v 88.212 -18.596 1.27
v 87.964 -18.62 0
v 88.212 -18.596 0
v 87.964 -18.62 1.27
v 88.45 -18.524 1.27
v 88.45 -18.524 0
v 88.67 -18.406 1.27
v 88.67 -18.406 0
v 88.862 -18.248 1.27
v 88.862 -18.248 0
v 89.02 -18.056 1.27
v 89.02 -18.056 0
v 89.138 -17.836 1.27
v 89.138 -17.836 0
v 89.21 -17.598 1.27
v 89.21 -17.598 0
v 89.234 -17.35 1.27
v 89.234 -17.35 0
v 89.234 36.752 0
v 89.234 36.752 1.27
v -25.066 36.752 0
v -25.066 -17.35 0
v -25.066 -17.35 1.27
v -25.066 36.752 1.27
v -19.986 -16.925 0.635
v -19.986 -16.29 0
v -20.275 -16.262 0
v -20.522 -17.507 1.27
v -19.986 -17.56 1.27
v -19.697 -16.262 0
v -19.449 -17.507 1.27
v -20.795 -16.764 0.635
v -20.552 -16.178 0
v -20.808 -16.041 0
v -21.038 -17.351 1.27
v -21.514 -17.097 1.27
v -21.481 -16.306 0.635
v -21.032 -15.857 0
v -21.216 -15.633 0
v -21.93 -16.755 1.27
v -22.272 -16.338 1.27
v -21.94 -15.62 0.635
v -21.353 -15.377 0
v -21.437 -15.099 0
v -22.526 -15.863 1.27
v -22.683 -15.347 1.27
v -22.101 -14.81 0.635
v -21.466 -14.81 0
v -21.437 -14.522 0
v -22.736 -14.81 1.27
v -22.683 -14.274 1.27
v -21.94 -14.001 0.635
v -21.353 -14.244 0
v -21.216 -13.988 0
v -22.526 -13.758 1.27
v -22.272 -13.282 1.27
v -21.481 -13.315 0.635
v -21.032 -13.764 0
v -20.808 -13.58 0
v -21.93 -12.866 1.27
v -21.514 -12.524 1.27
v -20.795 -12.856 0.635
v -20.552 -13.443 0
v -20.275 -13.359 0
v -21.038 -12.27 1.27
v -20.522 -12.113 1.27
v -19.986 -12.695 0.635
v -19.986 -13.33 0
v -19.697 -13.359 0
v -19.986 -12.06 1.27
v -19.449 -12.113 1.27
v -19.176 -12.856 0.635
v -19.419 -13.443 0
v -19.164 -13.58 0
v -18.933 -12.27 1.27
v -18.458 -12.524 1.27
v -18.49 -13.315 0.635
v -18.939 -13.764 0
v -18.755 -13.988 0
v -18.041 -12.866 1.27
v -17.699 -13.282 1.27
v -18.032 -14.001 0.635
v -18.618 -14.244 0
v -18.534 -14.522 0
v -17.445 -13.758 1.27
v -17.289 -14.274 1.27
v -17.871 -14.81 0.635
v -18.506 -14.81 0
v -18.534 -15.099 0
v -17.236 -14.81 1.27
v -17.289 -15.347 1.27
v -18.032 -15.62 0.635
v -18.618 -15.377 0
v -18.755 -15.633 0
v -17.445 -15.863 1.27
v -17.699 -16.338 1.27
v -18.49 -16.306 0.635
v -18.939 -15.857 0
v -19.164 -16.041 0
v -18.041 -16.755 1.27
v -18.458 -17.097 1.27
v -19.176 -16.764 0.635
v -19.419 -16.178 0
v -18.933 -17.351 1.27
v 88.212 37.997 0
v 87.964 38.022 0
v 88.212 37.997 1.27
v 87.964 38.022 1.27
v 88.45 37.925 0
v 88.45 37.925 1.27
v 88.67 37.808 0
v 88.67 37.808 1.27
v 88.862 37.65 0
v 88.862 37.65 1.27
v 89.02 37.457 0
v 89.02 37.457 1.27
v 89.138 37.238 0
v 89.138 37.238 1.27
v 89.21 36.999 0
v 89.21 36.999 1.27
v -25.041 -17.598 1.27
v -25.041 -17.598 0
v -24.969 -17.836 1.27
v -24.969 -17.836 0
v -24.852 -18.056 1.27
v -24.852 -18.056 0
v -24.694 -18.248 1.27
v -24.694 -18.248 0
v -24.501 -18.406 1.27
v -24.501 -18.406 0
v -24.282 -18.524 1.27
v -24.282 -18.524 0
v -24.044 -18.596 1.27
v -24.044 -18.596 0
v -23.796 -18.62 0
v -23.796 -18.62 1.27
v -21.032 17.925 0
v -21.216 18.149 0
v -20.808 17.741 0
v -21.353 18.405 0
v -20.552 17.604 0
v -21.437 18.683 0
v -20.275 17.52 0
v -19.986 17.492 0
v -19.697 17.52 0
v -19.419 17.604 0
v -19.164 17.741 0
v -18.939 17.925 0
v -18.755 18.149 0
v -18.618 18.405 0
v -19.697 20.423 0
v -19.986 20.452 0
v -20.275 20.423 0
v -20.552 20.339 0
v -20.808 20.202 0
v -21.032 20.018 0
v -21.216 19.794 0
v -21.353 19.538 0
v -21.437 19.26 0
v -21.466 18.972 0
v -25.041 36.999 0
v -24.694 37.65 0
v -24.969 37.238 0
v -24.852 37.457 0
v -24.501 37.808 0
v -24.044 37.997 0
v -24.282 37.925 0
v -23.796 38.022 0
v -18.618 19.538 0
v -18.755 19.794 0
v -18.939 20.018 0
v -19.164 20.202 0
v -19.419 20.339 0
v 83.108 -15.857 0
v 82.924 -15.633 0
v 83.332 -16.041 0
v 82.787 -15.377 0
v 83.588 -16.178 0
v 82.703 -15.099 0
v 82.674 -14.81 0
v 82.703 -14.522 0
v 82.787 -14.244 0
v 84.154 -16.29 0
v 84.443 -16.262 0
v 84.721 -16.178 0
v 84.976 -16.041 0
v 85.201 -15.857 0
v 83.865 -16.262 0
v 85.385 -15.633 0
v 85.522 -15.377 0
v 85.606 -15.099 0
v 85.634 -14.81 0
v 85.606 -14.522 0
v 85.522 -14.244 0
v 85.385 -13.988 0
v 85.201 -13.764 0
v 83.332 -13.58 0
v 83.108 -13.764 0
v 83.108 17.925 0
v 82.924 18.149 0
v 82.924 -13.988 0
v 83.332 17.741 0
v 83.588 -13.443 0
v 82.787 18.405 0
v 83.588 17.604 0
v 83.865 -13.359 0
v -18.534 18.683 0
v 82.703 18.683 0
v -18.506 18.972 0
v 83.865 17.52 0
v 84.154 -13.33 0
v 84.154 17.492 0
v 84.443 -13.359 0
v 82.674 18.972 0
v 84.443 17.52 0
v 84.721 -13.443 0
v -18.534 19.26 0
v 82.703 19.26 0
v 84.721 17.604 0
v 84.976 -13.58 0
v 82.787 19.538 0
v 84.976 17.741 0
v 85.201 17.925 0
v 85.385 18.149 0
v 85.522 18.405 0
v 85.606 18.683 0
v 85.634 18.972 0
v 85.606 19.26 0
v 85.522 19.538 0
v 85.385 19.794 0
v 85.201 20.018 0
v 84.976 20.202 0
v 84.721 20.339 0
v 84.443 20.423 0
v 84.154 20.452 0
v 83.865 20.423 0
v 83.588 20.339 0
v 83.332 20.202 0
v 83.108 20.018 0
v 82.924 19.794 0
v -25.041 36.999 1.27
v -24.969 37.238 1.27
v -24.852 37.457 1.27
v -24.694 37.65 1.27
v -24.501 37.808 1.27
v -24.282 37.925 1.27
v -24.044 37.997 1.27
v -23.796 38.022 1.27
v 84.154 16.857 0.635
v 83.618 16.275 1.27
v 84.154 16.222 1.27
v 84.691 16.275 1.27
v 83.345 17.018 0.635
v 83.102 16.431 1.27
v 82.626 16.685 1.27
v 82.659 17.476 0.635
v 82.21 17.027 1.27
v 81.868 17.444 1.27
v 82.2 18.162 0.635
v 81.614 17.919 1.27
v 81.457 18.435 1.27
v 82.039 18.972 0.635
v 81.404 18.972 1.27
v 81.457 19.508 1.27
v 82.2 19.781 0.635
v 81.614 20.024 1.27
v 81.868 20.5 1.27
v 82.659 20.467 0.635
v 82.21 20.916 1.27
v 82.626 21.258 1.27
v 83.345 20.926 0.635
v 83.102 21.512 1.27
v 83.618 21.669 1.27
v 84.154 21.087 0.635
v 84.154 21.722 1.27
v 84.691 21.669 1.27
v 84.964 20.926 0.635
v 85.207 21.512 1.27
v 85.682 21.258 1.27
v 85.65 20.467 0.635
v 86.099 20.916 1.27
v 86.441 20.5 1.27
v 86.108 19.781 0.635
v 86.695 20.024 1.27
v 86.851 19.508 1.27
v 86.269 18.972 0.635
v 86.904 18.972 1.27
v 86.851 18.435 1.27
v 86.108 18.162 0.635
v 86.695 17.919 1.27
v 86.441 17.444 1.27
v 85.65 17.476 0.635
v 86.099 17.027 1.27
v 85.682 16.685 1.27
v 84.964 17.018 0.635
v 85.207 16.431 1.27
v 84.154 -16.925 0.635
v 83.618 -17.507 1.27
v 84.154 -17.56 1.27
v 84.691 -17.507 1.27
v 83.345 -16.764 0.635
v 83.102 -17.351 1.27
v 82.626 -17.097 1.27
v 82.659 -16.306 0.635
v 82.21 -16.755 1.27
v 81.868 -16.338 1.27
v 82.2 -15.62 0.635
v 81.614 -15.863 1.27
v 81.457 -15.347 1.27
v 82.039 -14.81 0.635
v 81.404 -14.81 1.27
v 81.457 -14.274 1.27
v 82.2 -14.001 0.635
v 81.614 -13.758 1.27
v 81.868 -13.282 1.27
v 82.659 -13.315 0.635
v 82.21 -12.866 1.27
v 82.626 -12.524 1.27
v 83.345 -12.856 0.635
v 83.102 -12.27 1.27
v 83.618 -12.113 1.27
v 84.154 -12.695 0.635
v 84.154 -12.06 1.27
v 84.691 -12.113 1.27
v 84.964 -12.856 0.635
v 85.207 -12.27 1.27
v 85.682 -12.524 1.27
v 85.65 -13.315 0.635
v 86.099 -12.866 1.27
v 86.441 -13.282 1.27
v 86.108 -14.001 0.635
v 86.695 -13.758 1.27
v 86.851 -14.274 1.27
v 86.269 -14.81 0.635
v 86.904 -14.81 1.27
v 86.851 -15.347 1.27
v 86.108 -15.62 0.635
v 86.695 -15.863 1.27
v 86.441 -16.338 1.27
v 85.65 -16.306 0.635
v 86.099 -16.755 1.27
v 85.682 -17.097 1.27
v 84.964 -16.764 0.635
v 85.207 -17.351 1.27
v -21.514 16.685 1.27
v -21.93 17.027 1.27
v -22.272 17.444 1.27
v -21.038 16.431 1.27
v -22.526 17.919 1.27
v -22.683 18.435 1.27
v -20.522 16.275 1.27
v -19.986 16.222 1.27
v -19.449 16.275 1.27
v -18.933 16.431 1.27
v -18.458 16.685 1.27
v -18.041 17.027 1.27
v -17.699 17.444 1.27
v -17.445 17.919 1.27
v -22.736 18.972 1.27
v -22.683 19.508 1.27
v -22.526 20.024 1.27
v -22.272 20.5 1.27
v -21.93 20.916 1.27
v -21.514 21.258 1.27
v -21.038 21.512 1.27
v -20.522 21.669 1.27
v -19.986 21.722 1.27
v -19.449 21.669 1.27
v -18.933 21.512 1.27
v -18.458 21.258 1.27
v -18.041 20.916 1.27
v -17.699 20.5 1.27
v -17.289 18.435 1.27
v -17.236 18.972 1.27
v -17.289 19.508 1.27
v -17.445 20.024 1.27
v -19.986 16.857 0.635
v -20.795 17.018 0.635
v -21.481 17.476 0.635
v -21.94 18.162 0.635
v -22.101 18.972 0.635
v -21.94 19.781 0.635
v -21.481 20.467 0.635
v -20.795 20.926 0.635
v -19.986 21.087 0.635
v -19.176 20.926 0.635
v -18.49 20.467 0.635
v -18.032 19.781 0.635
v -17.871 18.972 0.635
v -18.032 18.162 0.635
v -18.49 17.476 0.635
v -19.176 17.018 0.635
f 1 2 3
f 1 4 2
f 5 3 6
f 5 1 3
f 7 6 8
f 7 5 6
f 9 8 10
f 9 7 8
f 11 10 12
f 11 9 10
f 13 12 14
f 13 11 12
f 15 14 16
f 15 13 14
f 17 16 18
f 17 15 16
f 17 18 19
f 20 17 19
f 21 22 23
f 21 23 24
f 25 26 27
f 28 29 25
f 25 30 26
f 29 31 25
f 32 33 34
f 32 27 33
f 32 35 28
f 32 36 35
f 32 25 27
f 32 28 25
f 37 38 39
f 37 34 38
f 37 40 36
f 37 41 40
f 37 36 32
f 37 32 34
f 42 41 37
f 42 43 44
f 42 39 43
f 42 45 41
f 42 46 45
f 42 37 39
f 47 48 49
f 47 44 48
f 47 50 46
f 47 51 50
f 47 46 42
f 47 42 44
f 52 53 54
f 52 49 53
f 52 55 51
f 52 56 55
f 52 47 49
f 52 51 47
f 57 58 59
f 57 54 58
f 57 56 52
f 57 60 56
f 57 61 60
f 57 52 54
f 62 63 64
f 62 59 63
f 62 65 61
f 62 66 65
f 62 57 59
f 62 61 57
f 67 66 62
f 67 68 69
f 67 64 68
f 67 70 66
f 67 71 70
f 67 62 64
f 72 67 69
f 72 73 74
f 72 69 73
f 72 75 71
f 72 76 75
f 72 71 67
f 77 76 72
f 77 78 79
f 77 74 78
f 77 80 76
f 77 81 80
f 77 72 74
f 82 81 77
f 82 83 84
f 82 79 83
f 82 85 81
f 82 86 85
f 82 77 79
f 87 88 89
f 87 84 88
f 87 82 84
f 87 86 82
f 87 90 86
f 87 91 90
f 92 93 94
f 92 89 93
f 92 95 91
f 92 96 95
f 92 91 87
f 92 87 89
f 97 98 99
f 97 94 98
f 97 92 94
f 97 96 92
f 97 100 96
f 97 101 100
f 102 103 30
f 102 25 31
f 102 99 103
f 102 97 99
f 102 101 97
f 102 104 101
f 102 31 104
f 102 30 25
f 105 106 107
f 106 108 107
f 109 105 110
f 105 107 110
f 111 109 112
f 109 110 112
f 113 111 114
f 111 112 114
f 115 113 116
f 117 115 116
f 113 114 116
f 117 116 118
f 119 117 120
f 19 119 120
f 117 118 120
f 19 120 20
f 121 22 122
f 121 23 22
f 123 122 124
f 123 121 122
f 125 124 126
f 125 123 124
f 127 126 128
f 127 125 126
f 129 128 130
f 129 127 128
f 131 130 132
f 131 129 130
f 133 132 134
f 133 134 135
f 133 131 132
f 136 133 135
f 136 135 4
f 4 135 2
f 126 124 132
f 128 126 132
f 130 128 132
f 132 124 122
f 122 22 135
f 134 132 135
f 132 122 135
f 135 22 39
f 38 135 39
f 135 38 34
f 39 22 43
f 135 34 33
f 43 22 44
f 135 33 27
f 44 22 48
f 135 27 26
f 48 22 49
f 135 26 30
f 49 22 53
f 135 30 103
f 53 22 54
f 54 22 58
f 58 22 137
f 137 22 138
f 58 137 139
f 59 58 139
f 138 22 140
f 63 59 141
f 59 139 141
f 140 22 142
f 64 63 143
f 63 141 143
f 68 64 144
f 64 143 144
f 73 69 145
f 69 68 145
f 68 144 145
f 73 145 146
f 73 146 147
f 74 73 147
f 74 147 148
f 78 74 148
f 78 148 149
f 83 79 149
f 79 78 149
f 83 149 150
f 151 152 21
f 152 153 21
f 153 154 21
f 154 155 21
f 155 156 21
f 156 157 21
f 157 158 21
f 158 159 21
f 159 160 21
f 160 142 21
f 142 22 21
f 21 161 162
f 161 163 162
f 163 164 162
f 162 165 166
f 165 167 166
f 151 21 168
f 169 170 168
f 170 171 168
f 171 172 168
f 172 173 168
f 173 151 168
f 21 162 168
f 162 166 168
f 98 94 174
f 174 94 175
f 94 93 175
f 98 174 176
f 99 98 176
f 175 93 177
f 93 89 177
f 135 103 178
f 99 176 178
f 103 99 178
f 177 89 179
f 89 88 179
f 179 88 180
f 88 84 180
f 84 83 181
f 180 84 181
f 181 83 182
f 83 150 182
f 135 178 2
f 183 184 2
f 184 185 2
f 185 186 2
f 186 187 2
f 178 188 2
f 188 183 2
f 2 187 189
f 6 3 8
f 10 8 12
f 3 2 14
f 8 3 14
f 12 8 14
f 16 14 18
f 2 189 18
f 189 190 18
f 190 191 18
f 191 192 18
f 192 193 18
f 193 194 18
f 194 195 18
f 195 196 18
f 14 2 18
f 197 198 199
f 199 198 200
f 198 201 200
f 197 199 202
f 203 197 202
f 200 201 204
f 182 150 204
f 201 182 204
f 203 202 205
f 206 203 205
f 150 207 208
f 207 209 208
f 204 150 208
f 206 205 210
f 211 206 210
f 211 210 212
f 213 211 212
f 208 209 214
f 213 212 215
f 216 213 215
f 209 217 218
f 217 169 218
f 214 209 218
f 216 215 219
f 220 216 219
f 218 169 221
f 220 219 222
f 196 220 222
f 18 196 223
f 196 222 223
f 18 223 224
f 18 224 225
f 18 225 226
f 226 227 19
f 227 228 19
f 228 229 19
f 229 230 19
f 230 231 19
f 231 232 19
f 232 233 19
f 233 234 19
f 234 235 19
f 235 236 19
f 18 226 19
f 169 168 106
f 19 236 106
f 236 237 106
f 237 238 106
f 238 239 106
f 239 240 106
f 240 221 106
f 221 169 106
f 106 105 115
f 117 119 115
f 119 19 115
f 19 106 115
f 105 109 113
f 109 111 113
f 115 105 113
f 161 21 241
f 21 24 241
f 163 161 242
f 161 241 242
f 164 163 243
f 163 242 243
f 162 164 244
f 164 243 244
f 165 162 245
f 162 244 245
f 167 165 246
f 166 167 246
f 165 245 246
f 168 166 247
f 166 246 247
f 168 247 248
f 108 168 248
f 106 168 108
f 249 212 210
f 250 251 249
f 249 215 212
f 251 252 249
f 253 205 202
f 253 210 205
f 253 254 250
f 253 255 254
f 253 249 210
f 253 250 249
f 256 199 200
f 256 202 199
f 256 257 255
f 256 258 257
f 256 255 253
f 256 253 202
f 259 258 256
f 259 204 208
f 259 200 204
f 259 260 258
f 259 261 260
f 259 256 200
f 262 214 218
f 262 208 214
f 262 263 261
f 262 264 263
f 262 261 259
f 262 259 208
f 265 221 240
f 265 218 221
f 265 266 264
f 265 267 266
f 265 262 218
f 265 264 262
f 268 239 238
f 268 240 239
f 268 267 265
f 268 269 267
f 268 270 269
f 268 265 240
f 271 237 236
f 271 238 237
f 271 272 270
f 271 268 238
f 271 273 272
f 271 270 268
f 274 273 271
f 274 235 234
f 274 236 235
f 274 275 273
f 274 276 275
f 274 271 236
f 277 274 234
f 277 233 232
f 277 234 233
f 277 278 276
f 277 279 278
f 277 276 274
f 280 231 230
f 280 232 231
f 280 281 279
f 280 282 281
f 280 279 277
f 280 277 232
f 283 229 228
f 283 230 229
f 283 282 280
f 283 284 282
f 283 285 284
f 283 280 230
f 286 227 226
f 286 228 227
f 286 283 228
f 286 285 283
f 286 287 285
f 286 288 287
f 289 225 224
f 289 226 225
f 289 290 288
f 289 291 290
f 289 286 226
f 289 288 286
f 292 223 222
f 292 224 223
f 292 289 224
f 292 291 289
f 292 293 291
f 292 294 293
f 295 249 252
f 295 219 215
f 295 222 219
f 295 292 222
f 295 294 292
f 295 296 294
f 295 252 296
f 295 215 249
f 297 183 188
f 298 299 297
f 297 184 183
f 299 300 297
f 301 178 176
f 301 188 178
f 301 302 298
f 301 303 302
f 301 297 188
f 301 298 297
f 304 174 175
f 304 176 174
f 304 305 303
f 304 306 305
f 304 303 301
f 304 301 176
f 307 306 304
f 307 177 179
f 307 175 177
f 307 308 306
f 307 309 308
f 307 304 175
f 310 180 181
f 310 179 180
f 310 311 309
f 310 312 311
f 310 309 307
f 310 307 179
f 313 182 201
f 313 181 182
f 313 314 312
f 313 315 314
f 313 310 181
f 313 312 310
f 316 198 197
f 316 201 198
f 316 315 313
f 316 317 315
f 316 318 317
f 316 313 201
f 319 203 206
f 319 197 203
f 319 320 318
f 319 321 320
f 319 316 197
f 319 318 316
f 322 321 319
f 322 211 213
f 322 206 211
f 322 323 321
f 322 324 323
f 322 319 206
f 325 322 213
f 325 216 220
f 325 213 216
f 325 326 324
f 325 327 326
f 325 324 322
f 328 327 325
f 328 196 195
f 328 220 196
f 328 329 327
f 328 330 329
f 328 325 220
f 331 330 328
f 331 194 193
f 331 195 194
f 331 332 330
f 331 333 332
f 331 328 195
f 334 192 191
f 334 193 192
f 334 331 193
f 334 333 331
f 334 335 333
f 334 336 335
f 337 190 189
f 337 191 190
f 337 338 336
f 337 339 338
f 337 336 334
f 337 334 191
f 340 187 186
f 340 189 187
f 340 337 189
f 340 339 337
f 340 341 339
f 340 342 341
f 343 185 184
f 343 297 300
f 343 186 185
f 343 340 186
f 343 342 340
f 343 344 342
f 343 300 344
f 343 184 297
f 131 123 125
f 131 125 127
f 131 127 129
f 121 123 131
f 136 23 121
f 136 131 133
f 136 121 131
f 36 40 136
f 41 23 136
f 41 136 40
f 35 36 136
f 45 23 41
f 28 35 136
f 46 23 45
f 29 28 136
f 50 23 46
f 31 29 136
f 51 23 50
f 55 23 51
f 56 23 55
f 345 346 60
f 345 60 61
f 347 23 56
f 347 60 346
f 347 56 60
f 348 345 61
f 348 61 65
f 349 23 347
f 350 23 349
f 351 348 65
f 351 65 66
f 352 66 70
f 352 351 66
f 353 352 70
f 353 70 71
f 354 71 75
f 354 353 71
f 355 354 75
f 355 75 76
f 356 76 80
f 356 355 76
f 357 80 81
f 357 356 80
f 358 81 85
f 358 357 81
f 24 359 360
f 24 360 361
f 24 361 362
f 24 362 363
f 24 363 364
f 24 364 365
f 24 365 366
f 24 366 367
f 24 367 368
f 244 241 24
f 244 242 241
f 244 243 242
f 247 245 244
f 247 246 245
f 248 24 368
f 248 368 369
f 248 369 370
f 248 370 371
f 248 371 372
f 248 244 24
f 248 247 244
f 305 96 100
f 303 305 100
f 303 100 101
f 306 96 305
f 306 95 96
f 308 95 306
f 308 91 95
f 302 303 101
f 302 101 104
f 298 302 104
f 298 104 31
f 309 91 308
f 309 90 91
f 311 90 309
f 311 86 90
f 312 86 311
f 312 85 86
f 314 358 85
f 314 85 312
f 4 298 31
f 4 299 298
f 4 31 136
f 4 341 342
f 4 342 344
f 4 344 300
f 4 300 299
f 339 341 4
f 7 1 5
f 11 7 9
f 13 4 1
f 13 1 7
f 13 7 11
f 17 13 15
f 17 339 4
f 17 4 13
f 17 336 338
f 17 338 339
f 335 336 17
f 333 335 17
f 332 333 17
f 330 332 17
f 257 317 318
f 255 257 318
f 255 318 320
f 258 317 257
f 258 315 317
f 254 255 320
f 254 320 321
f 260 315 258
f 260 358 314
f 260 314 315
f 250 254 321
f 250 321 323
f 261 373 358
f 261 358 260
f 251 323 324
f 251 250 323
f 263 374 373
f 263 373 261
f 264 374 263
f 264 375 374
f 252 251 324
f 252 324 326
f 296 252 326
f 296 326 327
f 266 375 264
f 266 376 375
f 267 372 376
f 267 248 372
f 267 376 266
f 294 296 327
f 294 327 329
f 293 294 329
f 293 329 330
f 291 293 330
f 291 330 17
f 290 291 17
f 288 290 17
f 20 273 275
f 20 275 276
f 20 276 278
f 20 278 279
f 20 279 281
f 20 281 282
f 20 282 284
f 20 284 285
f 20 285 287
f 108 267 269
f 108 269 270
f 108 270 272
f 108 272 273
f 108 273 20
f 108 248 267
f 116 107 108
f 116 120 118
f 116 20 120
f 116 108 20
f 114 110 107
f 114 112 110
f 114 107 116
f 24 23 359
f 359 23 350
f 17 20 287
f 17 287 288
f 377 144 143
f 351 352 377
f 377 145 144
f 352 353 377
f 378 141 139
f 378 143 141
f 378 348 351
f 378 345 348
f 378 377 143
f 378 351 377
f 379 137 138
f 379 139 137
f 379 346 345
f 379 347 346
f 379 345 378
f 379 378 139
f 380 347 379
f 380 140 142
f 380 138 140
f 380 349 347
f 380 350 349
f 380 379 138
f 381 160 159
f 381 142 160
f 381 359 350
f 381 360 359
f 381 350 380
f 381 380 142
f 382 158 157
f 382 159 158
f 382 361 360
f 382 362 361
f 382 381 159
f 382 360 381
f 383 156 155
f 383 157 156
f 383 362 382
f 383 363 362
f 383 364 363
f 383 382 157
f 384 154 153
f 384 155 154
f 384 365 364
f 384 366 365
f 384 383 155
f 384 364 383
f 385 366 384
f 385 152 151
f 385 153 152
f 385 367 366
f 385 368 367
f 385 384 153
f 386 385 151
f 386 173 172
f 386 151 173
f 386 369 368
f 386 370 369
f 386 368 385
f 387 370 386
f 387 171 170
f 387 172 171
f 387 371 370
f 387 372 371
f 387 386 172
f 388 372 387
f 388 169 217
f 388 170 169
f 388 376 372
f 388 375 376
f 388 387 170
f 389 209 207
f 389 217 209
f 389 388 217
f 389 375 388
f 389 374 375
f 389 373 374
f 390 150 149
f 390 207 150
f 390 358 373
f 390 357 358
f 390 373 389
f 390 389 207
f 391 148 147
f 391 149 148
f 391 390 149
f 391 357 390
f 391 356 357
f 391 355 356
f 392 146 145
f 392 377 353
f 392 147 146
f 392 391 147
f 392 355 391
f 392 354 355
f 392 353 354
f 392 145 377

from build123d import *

# Parameters (mm, degrees)
SKETCH2_W                                    = 114.3
SKETCH2_H                                    = 56.642
BOSS_EXTRUDE1_DEPTH                          = 1.27
CSK_FOR_M2_5_COUNTERSUNK_FLAT_HEAD_S_2_COUNT = 2
CSK_FOR_M2_5_COUNTERSUNK_FLAT_HEAD_S_2_PITCH = 33.782
CSK_FOR_M2_5_COUNTERSUNK_FLAT_HEAD_S_3_COUNT = 2
CSK_FOR_M2_5_COUNTERSUNK_FLAT_HEAD_S_3_PITCH = 109.482250269
CSK_FOR_M2_5_COUNTERSUNK_FLAT_HEAD_S_4_COUNT = 2
CSK_FOR_M2_5_COUNTERSUNK_FLAT_HEAD_S_4_PITCH = 104.14
FILLET1_R                                    = 1.27


with BuildPart() as part:
    # Sketch2 → Boss-Extrude1 (new body)
    with BuildSketch(Plane.XY):
        with Locations((32.084210526, 9.700699248)):
            Rectangle(SKETCH2_W, SKETCH2_H)
    extrude(amount=BOSS_EXTRUDE1_DEPTH)

    # Sketch6 → CSK for M2.5 Countersunk Flat Head Screw1 (revolve, cut)
    with BuildSketch(Plane(origin=(-19.985789474, 18.971699248, 1.27), x_dir=(0, -1, 0), z_dir=(1, 0, 0))):
        Polygon((0, 0), (0, 1.27), (1.45, 1.27), (1.45, 1.3), (2.75, 0), align=None)
    csk_for_m2_5_countersunk_flat_head_screw = revolve(axis=Axis((-19.985789474, 18.971699248, 7.62), (0, 0, -1)), mode=Mode.SUBTRACT)

    # CSK for M2.5 Countersunk Flat Head S 2: CSK for M2.5 Countersunk Flat Head Screw1 ×2
    with Locations(*[(0, -i * CSK_FOR_M2_5_COUNTERSUNK_FLAT_HEAD_S_2_PITCH, 0) for i in range(1, CSK_FOR_M2_5_COUNTERSUNK_FLAT_HEAD_S_2_COUNT)]):
        add(csk_for_m2_5_countersunk_flat_head_screw, mode=Mode.SUBTRACT)

    # CSK for M2.5 Countersunk Flat Head S 3: CSK for M2.5 Countersunk Flat Head Screw1 ×2
    with Locations(*[Vector(0.9512044166426011, -0.3085614327157706, 0) * (i * CSK_FOR_M2_5_COUNTERSUNK_FLAT_HEAD_S_3_PITCH) for i in range(1, CSK_FOR_M2_5_COUNTERSUNK_FLAT_HEAD_S_3_COUNT)]):
        add(csk_for_m2_5_countersunk_flat_head_screw, mode=Mode.SUBTRACT)

    # CSK for M2.5 Countersunk Flat Head S 4: CSK for M2.5 Countersunk Flat Head Screw1 ×2
    with Locations(*[(i * CSK_FOR_M2_5_COUNTERSUNK_FLAT_HEAD_S_4_PITCH, 0, 0) for i in range(1, CSK_FOR_M2_5_COUNTERSUNK_FLAT_HEAD_S_4_COUNT)]):
        add(csk_for_m2_5_countersunk_flat_head_screw, mode=Mode.SUBTRACT)

    # Fillet1
    fillet1_edges = [part.edges().sort_by_distance(p)[0] for p in [
        (-25.065789474, 38.021699248, 0.635),
        (89.234210526, 38.021699248, 0.635),
        (89.234210526, -18.620300752, 0.635),
        (-25.065789474, -18.620300752, 0.635),
    ]]
    fillet(fillet1_edges, radius=FILLET1_R)


solid = part.part
